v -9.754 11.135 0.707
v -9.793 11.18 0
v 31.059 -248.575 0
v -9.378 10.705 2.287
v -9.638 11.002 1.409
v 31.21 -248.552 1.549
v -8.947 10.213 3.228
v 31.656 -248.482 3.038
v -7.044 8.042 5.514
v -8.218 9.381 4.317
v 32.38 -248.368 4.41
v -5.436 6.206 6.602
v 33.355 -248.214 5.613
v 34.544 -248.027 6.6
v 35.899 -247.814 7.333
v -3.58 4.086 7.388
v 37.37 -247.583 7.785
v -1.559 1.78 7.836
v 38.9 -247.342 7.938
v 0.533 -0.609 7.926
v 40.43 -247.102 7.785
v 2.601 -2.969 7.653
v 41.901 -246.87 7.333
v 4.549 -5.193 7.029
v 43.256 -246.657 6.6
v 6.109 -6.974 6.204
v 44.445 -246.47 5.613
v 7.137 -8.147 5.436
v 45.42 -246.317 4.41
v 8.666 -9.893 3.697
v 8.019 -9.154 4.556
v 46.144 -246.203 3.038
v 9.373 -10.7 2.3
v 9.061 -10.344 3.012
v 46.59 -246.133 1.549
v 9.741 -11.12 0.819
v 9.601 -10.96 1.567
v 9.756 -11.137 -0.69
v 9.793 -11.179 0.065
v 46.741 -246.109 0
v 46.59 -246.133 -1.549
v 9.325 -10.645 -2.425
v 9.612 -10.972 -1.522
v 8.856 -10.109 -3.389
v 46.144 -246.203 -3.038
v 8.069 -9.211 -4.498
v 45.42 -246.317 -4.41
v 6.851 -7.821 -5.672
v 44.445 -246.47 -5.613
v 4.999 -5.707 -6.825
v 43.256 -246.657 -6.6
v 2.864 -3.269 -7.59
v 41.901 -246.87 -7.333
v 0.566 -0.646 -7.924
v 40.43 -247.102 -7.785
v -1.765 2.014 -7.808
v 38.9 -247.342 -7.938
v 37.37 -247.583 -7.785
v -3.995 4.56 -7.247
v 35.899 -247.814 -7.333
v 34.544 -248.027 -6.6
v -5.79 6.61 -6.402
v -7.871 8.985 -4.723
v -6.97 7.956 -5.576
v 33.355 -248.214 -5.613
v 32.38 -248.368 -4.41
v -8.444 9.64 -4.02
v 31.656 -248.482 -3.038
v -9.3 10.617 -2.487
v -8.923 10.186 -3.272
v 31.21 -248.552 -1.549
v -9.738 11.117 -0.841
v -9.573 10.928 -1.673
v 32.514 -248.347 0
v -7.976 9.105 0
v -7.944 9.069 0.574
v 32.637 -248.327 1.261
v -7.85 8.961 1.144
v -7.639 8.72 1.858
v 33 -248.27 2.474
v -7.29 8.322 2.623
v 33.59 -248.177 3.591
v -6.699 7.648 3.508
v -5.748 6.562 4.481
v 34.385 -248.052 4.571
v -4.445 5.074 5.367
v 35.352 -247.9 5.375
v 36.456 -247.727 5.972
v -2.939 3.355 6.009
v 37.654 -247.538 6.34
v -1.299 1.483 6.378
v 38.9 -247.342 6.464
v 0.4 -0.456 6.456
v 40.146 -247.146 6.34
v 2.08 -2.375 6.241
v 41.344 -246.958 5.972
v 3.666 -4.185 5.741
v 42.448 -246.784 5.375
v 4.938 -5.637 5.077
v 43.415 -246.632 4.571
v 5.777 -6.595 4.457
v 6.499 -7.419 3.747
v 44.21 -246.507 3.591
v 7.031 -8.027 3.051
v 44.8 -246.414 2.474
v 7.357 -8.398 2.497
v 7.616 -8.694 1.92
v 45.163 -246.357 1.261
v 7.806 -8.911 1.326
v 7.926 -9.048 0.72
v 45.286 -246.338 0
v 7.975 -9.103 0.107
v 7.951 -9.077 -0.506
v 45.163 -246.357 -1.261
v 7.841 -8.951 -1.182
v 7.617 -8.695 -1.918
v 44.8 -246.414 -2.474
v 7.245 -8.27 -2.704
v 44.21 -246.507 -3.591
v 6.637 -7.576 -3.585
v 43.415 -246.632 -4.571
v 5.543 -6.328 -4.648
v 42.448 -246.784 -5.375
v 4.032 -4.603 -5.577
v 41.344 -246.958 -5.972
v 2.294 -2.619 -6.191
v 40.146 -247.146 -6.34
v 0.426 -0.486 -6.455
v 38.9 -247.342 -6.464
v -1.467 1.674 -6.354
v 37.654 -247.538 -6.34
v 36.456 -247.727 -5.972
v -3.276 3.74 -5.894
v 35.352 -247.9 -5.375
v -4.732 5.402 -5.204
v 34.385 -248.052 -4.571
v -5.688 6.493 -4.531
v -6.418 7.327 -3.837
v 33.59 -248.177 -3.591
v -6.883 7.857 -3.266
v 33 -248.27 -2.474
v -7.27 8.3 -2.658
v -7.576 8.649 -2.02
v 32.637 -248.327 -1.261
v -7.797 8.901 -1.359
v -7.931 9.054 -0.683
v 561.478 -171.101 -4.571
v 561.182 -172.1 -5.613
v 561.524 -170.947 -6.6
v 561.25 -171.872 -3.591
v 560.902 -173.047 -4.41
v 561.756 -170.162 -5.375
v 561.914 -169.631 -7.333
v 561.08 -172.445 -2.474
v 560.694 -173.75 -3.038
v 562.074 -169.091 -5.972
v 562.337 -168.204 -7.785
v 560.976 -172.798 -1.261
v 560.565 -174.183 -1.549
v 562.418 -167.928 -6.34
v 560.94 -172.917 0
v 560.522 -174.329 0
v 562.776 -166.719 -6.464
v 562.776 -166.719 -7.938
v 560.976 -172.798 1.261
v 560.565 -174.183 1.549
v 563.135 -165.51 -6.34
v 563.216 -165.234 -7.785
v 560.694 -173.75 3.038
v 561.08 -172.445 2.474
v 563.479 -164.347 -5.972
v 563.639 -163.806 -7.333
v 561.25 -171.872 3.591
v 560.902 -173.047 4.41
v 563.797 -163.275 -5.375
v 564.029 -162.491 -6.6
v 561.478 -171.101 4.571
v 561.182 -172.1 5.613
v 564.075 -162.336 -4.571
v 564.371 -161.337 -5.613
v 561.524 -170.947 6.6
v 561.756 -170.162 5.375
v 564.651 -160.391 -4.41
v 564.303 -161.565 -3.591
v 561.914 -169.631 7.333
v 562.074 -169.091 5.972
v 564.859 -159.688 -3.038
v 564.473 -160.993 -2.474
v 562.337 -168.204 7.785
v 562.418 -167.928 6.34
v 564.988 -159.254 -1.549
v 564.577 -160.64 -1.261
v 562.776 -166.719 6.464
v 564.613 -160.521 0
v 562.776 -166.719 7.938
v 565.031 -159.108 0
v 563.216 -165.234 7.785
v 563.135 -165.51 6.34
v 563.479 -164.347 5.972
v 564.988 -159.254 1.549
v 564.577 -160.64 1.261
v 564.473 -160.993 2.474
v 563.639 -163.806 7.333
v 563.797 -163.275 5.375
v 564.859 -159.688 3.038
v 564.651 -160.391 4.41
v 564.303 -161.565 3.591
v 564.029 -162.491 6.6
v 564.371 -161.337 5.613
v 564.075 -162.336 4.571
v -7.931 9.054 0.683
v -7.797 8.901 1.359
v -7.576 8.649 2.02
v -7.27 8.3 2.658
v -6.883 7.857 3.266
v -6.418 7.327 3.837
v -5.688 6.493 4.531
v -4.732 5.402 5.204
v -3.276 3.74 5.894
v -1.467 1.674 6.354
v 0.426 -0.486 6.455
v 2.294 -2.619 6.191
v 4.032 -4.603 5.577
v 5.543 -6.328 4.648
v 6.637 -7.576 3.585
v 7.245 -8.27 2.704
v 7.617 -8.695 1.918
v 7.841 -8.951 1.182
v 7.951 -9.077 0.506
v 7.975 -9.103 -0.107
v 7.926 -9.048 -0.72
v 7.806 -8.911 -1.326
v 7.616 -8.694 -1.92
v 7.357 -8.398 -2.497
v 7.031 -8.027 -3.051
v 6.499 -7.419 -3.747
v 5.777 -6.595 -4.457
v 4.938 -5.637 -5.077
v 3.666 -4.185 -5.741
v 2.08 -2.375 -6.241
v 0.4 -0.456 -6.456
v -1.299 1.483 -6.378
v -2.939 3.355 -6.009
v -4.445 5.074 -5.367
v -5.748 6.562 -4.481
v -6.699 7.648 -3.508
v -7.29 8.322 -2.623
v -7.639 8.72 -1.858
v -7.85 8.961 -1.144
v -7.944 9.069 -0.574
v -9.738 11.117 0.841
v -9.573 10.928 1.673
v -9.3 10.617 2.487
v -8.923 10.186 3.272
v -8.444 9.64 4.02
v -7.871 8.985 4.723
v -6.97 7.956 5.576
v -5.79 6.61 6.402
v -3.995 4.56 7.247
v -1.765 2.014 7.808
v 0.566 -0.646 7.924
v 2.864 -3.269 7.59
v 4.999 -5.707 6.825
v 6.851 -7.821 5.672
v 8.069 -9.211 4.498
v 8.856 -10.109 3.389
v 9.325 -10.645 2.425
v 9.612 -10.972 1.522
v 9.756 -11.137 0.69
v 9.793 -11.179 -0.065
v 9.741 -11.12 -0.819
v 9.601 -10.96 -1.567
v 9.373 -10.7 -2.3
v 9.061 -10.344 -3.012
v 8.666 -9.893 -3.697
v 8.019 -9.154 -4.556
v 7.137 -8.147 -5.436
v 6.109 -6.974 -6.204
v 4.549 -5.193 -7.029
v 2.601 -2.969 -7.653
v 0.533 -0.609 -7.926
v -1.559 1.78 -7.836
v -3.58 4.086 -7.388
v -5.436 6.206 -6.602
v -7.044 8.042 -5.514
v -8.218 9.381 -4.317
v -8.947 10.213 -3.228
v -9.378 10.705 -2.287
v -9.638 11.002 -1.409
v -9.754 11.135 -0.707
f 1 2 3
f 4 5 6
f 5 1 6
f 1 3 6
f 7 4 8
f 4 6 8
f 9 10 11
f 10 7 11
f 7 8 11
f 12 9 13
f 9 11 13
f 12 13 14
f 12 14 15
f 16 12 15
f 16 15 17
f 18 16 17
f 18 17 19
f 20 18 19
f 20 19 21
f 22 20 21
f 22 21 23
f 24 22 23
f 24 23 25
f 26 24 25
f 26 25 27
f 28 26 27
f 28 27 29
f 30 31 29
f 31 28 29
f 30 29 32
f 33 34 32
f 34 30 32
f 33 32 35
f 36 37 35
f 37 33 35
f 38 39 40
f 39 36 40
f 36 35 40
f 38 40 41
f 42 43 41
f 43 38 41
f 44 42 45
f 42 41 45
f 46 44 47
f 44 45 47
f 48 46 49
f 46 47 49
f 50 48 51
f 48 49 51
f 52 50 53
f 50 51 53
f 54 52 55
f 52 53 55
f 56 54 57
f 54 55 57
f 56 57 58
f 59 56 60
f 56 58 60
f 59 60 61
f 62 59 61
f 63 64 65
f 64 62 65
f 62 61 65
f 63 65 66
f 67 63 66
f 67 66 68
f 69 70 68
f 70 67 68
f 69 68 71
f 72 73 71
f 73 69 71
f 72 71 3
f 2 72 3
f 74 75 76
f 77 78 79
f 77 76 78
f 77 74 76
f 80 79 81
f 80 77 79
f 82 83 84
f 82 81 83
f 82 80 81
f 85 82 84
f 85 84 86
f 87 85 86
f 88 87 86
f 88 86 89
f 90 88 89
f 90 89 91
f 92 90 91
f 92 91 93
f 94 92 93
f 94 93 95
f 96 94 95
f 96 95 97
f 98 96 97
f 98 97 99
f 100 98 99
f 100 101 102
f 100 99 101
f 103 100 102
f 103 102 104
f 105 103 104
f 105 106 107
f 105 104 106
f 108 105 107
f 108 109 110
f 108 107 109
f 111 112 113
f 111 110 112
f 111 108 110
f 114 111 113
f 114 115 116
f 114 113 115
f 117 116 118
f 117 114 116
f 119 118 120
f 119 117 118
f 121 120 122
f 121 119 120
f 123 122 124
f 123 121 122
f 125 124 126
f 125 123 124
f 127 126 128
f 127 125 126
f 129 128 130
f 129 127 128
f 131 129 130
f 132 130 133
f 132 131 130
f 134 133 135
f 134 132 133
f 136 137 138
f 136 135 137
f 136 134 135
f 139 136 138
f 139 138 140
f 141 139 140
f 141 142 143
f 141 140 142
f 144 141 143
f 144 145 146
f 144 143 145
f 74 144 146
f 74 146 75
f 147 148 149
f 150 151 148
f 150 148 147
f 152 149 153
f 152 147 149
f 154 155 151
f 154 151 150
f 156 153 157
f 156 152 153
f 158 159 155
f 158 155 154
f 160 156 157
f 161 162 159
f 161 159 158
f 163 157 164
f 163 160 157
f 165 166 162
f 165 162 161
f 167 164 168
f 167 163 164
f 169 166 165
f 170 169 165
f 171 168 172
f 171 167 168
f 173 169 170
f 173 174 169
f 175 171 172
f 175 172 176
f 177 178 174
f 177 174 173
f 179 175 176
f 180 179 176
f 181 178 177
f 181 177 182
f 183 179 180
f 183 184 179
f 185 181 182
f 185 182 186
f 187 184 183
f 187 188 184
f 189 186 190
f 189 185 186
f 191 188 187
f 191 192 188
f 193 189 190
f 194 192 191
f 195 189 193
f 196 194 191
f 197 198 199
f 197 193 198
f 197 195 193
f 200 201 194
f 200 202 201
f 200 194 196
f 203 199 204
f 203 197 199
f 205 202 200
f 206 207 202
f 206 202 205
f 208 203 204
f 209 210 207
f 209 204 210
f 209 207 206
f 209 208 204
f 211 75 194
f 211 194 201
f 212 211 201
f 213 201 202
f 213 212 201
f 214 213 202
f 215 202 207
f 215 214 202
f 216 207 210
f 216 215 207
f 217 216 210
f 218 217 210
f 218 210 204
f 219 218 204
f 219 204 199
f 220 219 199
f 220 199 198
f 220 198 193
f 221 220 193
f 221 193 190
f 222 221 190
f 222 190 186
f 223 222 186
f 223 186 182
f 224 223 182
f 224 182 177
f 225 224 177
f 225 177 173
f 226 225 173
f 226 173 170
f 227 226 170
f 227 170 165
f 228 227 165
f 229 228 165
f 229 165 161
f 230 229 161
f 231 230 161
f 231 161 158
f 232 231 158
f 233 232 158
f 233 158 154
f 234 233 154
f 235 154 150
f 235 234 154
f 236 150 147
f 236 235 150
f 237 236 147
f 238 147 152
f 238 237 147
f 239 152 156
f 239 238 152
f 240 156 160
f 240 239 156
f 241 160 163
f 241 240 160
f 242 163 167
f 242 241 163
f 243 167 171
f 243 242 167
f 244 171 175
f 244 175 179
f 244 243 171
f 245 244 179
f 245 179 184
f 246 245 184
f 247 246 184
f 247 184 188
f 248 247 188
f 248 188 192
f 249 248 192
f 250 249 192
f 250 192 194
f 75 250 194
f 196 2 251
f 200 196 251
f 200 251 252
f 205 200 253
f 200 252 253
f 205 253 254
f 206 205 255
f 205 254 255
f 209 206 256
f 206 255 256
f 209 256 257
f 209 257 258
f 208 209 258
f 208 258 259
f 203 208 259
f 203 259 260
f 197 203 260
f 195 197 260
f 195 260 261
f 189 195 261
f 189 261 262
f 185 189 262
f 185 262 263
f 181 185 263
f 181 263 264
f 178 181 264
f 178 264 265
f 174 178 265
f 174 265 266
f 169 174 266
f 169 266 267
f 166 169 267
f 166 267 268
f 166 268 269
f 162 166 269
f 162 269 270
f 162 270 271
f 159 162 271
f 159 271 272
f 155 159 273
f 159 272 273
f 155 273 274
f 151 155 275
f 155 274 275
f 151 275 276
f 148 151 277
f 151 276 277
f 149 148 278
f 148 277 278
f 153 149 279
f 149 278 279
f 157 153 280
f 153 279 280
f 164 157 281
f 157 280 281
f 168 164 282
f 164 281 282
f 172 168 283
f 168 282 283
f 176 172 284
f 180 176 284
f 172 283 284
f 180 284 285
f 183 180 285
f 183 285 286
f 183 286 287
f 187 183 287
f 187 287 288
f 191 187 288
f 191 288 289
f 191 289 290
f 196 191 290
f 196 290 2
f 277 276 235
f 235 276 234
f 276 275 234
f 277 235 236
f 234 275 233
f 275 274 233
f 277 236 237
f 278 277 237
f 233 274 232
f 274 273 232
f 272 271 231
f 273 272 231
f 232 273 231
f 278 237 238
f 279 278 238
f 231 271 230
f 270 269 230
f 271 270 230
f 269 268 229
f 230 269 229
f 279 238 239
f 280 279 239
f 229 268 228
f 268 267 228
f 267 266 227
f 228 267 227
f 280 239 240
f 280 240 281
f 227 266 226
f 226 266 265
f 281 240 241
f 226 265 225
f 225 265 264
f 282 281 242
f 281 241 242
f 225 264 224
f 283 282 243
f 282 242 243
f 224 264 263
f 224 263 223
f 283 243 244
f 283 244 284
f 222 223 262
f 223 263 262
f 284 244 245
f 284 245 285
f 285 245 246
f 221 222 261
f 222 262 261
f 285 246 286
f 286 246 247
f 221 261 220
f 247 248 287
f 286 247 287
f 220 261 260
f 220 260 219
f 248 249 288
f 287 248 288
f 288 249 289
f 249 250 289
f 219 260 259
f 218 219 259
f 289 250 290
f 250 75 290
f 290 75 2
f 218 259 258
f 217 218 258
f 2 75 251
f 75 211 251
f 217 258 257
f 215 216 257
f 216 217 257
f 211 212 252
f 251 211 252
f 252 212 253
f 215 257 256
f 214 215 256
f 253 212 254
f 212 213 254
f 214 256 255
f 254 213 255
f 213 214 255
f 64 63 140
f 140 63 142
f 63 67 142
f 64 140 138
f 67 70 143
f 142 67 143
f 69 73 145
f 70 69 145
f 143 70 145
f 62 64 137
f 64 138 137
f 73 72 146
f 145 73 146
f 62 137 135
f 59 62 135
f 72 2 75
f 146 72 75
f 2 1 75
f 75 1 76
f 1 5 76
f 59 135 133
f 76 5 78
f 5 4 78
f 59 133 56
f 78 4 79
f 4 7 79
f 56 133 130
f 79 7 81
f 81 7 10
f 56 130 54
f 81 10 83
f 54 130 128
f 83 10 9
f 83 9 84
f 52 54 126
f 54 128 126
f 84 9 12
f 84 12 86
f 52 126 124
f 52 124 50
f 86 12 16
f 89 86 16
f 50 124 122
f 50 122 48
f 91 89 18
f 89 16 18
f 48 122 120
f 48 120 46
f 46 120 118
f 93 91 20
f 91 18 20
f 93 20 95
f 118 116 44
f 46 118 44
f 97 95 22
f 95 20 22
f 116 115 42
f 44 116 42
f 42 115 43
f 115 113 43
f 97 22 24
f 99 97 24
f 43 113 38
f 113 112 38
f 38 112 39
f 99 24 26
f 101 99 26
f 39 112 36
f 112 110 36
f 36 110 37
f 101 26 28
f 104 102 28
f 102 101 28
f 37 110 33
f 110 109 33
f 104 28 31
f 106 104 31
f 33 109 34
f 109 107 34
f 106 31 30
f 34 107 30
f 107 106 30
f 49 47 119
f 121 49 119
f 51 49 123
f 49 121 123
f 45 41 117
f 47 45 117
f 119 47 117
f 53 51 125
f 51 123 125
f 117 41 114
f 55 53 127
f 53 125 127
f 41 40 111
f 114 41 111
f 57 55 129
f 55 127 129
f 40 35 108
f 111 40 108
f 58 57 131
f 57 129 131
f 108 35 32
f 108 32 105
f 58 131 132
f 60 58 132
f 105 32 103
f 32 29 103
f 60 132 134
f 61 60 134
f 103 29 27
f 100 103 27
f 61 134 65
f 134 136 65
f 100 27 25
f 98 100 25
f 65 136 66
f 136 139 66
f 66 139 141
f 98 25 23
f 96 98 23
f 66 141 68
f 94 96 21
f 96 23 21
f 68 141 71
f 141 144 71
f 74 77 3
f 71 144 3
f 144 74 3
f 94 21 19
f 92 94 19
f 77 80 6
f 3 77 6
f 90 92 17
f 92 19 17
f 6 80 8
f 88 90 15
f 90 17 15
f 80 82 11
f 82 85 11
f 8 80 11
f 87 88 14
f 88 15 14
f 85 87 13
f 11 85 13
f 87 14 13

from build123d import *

# Parameters (mm, degrees)
SKETCH11_R                 = 7.9375
SKETCH11_R_2               = 6.4643
STRUCTURAL_MEMBER1_DEPTH   = 269.152773911
SKETCH11_ON_SEGMENT_2_R    = 7.9375
SKETCH11_ON_SEGMENT_2_R_2  = 6.4643
STRUCTURAL_MEMBER1_2_DEPTH = 605.722096433


with BuildPart() as part:
    # Sketch11 → Structural Member1 (new body)
    with BuildSketch(Plane(origin=(38.9, -247.342302395, 0), x_dir=(-0.9878575646087404, -0.15536226068543246, 0), z_dir=(-0.15536226068543246, 0.9878575646087404, 0))):
        Circle(SKETCH11_R)
        Circle(SKETCH11_R_2, mode=Mode.SUBTRACT)
    extrude(amount=STRUCTURAL_MEMBER1_DEPTH)

    # Structural Member1 mitre 1
    split(bisect_by=Plane(origin=(0, 0, 0), x_dir=(0.658927354, -0.752206582, 0), z_dir=(-0.752206582, -0.658927354, 0)), keep=Keep.TOP)


with BuildPart() as body_2:
    # Sketch11 on segment 2 (carried to segment 2) → Structural Member1 2 (new body)
    with BuildSketch(Plane(origin=(-17.9971088, 5.331523223, 0), x_dir=(0.284041633, 0.958811948, 0), z_dir=(0.958811948, -0.284041633, 0))):
        Circle(SKETCH11_ON_SEGMENT_2_R)
        Circle(SKETCH11_ON_SEGMENT_2_R_2, mode=Mode.SUBTRACT)
    extrude(amount=STRUCTURAL_MEMBER1_2_DEPTH)

    # Structural Member1 2 mitre 1
    split(bisect_by=Plane(origin=(0, 0, 0), x_dir=(-0.658927354, 0.752206582, 0), z_dir=(0.752206582, 0.658927354, 0)), keep=Keep.TOP)


solid = Compound([part.part, body_2.part])
